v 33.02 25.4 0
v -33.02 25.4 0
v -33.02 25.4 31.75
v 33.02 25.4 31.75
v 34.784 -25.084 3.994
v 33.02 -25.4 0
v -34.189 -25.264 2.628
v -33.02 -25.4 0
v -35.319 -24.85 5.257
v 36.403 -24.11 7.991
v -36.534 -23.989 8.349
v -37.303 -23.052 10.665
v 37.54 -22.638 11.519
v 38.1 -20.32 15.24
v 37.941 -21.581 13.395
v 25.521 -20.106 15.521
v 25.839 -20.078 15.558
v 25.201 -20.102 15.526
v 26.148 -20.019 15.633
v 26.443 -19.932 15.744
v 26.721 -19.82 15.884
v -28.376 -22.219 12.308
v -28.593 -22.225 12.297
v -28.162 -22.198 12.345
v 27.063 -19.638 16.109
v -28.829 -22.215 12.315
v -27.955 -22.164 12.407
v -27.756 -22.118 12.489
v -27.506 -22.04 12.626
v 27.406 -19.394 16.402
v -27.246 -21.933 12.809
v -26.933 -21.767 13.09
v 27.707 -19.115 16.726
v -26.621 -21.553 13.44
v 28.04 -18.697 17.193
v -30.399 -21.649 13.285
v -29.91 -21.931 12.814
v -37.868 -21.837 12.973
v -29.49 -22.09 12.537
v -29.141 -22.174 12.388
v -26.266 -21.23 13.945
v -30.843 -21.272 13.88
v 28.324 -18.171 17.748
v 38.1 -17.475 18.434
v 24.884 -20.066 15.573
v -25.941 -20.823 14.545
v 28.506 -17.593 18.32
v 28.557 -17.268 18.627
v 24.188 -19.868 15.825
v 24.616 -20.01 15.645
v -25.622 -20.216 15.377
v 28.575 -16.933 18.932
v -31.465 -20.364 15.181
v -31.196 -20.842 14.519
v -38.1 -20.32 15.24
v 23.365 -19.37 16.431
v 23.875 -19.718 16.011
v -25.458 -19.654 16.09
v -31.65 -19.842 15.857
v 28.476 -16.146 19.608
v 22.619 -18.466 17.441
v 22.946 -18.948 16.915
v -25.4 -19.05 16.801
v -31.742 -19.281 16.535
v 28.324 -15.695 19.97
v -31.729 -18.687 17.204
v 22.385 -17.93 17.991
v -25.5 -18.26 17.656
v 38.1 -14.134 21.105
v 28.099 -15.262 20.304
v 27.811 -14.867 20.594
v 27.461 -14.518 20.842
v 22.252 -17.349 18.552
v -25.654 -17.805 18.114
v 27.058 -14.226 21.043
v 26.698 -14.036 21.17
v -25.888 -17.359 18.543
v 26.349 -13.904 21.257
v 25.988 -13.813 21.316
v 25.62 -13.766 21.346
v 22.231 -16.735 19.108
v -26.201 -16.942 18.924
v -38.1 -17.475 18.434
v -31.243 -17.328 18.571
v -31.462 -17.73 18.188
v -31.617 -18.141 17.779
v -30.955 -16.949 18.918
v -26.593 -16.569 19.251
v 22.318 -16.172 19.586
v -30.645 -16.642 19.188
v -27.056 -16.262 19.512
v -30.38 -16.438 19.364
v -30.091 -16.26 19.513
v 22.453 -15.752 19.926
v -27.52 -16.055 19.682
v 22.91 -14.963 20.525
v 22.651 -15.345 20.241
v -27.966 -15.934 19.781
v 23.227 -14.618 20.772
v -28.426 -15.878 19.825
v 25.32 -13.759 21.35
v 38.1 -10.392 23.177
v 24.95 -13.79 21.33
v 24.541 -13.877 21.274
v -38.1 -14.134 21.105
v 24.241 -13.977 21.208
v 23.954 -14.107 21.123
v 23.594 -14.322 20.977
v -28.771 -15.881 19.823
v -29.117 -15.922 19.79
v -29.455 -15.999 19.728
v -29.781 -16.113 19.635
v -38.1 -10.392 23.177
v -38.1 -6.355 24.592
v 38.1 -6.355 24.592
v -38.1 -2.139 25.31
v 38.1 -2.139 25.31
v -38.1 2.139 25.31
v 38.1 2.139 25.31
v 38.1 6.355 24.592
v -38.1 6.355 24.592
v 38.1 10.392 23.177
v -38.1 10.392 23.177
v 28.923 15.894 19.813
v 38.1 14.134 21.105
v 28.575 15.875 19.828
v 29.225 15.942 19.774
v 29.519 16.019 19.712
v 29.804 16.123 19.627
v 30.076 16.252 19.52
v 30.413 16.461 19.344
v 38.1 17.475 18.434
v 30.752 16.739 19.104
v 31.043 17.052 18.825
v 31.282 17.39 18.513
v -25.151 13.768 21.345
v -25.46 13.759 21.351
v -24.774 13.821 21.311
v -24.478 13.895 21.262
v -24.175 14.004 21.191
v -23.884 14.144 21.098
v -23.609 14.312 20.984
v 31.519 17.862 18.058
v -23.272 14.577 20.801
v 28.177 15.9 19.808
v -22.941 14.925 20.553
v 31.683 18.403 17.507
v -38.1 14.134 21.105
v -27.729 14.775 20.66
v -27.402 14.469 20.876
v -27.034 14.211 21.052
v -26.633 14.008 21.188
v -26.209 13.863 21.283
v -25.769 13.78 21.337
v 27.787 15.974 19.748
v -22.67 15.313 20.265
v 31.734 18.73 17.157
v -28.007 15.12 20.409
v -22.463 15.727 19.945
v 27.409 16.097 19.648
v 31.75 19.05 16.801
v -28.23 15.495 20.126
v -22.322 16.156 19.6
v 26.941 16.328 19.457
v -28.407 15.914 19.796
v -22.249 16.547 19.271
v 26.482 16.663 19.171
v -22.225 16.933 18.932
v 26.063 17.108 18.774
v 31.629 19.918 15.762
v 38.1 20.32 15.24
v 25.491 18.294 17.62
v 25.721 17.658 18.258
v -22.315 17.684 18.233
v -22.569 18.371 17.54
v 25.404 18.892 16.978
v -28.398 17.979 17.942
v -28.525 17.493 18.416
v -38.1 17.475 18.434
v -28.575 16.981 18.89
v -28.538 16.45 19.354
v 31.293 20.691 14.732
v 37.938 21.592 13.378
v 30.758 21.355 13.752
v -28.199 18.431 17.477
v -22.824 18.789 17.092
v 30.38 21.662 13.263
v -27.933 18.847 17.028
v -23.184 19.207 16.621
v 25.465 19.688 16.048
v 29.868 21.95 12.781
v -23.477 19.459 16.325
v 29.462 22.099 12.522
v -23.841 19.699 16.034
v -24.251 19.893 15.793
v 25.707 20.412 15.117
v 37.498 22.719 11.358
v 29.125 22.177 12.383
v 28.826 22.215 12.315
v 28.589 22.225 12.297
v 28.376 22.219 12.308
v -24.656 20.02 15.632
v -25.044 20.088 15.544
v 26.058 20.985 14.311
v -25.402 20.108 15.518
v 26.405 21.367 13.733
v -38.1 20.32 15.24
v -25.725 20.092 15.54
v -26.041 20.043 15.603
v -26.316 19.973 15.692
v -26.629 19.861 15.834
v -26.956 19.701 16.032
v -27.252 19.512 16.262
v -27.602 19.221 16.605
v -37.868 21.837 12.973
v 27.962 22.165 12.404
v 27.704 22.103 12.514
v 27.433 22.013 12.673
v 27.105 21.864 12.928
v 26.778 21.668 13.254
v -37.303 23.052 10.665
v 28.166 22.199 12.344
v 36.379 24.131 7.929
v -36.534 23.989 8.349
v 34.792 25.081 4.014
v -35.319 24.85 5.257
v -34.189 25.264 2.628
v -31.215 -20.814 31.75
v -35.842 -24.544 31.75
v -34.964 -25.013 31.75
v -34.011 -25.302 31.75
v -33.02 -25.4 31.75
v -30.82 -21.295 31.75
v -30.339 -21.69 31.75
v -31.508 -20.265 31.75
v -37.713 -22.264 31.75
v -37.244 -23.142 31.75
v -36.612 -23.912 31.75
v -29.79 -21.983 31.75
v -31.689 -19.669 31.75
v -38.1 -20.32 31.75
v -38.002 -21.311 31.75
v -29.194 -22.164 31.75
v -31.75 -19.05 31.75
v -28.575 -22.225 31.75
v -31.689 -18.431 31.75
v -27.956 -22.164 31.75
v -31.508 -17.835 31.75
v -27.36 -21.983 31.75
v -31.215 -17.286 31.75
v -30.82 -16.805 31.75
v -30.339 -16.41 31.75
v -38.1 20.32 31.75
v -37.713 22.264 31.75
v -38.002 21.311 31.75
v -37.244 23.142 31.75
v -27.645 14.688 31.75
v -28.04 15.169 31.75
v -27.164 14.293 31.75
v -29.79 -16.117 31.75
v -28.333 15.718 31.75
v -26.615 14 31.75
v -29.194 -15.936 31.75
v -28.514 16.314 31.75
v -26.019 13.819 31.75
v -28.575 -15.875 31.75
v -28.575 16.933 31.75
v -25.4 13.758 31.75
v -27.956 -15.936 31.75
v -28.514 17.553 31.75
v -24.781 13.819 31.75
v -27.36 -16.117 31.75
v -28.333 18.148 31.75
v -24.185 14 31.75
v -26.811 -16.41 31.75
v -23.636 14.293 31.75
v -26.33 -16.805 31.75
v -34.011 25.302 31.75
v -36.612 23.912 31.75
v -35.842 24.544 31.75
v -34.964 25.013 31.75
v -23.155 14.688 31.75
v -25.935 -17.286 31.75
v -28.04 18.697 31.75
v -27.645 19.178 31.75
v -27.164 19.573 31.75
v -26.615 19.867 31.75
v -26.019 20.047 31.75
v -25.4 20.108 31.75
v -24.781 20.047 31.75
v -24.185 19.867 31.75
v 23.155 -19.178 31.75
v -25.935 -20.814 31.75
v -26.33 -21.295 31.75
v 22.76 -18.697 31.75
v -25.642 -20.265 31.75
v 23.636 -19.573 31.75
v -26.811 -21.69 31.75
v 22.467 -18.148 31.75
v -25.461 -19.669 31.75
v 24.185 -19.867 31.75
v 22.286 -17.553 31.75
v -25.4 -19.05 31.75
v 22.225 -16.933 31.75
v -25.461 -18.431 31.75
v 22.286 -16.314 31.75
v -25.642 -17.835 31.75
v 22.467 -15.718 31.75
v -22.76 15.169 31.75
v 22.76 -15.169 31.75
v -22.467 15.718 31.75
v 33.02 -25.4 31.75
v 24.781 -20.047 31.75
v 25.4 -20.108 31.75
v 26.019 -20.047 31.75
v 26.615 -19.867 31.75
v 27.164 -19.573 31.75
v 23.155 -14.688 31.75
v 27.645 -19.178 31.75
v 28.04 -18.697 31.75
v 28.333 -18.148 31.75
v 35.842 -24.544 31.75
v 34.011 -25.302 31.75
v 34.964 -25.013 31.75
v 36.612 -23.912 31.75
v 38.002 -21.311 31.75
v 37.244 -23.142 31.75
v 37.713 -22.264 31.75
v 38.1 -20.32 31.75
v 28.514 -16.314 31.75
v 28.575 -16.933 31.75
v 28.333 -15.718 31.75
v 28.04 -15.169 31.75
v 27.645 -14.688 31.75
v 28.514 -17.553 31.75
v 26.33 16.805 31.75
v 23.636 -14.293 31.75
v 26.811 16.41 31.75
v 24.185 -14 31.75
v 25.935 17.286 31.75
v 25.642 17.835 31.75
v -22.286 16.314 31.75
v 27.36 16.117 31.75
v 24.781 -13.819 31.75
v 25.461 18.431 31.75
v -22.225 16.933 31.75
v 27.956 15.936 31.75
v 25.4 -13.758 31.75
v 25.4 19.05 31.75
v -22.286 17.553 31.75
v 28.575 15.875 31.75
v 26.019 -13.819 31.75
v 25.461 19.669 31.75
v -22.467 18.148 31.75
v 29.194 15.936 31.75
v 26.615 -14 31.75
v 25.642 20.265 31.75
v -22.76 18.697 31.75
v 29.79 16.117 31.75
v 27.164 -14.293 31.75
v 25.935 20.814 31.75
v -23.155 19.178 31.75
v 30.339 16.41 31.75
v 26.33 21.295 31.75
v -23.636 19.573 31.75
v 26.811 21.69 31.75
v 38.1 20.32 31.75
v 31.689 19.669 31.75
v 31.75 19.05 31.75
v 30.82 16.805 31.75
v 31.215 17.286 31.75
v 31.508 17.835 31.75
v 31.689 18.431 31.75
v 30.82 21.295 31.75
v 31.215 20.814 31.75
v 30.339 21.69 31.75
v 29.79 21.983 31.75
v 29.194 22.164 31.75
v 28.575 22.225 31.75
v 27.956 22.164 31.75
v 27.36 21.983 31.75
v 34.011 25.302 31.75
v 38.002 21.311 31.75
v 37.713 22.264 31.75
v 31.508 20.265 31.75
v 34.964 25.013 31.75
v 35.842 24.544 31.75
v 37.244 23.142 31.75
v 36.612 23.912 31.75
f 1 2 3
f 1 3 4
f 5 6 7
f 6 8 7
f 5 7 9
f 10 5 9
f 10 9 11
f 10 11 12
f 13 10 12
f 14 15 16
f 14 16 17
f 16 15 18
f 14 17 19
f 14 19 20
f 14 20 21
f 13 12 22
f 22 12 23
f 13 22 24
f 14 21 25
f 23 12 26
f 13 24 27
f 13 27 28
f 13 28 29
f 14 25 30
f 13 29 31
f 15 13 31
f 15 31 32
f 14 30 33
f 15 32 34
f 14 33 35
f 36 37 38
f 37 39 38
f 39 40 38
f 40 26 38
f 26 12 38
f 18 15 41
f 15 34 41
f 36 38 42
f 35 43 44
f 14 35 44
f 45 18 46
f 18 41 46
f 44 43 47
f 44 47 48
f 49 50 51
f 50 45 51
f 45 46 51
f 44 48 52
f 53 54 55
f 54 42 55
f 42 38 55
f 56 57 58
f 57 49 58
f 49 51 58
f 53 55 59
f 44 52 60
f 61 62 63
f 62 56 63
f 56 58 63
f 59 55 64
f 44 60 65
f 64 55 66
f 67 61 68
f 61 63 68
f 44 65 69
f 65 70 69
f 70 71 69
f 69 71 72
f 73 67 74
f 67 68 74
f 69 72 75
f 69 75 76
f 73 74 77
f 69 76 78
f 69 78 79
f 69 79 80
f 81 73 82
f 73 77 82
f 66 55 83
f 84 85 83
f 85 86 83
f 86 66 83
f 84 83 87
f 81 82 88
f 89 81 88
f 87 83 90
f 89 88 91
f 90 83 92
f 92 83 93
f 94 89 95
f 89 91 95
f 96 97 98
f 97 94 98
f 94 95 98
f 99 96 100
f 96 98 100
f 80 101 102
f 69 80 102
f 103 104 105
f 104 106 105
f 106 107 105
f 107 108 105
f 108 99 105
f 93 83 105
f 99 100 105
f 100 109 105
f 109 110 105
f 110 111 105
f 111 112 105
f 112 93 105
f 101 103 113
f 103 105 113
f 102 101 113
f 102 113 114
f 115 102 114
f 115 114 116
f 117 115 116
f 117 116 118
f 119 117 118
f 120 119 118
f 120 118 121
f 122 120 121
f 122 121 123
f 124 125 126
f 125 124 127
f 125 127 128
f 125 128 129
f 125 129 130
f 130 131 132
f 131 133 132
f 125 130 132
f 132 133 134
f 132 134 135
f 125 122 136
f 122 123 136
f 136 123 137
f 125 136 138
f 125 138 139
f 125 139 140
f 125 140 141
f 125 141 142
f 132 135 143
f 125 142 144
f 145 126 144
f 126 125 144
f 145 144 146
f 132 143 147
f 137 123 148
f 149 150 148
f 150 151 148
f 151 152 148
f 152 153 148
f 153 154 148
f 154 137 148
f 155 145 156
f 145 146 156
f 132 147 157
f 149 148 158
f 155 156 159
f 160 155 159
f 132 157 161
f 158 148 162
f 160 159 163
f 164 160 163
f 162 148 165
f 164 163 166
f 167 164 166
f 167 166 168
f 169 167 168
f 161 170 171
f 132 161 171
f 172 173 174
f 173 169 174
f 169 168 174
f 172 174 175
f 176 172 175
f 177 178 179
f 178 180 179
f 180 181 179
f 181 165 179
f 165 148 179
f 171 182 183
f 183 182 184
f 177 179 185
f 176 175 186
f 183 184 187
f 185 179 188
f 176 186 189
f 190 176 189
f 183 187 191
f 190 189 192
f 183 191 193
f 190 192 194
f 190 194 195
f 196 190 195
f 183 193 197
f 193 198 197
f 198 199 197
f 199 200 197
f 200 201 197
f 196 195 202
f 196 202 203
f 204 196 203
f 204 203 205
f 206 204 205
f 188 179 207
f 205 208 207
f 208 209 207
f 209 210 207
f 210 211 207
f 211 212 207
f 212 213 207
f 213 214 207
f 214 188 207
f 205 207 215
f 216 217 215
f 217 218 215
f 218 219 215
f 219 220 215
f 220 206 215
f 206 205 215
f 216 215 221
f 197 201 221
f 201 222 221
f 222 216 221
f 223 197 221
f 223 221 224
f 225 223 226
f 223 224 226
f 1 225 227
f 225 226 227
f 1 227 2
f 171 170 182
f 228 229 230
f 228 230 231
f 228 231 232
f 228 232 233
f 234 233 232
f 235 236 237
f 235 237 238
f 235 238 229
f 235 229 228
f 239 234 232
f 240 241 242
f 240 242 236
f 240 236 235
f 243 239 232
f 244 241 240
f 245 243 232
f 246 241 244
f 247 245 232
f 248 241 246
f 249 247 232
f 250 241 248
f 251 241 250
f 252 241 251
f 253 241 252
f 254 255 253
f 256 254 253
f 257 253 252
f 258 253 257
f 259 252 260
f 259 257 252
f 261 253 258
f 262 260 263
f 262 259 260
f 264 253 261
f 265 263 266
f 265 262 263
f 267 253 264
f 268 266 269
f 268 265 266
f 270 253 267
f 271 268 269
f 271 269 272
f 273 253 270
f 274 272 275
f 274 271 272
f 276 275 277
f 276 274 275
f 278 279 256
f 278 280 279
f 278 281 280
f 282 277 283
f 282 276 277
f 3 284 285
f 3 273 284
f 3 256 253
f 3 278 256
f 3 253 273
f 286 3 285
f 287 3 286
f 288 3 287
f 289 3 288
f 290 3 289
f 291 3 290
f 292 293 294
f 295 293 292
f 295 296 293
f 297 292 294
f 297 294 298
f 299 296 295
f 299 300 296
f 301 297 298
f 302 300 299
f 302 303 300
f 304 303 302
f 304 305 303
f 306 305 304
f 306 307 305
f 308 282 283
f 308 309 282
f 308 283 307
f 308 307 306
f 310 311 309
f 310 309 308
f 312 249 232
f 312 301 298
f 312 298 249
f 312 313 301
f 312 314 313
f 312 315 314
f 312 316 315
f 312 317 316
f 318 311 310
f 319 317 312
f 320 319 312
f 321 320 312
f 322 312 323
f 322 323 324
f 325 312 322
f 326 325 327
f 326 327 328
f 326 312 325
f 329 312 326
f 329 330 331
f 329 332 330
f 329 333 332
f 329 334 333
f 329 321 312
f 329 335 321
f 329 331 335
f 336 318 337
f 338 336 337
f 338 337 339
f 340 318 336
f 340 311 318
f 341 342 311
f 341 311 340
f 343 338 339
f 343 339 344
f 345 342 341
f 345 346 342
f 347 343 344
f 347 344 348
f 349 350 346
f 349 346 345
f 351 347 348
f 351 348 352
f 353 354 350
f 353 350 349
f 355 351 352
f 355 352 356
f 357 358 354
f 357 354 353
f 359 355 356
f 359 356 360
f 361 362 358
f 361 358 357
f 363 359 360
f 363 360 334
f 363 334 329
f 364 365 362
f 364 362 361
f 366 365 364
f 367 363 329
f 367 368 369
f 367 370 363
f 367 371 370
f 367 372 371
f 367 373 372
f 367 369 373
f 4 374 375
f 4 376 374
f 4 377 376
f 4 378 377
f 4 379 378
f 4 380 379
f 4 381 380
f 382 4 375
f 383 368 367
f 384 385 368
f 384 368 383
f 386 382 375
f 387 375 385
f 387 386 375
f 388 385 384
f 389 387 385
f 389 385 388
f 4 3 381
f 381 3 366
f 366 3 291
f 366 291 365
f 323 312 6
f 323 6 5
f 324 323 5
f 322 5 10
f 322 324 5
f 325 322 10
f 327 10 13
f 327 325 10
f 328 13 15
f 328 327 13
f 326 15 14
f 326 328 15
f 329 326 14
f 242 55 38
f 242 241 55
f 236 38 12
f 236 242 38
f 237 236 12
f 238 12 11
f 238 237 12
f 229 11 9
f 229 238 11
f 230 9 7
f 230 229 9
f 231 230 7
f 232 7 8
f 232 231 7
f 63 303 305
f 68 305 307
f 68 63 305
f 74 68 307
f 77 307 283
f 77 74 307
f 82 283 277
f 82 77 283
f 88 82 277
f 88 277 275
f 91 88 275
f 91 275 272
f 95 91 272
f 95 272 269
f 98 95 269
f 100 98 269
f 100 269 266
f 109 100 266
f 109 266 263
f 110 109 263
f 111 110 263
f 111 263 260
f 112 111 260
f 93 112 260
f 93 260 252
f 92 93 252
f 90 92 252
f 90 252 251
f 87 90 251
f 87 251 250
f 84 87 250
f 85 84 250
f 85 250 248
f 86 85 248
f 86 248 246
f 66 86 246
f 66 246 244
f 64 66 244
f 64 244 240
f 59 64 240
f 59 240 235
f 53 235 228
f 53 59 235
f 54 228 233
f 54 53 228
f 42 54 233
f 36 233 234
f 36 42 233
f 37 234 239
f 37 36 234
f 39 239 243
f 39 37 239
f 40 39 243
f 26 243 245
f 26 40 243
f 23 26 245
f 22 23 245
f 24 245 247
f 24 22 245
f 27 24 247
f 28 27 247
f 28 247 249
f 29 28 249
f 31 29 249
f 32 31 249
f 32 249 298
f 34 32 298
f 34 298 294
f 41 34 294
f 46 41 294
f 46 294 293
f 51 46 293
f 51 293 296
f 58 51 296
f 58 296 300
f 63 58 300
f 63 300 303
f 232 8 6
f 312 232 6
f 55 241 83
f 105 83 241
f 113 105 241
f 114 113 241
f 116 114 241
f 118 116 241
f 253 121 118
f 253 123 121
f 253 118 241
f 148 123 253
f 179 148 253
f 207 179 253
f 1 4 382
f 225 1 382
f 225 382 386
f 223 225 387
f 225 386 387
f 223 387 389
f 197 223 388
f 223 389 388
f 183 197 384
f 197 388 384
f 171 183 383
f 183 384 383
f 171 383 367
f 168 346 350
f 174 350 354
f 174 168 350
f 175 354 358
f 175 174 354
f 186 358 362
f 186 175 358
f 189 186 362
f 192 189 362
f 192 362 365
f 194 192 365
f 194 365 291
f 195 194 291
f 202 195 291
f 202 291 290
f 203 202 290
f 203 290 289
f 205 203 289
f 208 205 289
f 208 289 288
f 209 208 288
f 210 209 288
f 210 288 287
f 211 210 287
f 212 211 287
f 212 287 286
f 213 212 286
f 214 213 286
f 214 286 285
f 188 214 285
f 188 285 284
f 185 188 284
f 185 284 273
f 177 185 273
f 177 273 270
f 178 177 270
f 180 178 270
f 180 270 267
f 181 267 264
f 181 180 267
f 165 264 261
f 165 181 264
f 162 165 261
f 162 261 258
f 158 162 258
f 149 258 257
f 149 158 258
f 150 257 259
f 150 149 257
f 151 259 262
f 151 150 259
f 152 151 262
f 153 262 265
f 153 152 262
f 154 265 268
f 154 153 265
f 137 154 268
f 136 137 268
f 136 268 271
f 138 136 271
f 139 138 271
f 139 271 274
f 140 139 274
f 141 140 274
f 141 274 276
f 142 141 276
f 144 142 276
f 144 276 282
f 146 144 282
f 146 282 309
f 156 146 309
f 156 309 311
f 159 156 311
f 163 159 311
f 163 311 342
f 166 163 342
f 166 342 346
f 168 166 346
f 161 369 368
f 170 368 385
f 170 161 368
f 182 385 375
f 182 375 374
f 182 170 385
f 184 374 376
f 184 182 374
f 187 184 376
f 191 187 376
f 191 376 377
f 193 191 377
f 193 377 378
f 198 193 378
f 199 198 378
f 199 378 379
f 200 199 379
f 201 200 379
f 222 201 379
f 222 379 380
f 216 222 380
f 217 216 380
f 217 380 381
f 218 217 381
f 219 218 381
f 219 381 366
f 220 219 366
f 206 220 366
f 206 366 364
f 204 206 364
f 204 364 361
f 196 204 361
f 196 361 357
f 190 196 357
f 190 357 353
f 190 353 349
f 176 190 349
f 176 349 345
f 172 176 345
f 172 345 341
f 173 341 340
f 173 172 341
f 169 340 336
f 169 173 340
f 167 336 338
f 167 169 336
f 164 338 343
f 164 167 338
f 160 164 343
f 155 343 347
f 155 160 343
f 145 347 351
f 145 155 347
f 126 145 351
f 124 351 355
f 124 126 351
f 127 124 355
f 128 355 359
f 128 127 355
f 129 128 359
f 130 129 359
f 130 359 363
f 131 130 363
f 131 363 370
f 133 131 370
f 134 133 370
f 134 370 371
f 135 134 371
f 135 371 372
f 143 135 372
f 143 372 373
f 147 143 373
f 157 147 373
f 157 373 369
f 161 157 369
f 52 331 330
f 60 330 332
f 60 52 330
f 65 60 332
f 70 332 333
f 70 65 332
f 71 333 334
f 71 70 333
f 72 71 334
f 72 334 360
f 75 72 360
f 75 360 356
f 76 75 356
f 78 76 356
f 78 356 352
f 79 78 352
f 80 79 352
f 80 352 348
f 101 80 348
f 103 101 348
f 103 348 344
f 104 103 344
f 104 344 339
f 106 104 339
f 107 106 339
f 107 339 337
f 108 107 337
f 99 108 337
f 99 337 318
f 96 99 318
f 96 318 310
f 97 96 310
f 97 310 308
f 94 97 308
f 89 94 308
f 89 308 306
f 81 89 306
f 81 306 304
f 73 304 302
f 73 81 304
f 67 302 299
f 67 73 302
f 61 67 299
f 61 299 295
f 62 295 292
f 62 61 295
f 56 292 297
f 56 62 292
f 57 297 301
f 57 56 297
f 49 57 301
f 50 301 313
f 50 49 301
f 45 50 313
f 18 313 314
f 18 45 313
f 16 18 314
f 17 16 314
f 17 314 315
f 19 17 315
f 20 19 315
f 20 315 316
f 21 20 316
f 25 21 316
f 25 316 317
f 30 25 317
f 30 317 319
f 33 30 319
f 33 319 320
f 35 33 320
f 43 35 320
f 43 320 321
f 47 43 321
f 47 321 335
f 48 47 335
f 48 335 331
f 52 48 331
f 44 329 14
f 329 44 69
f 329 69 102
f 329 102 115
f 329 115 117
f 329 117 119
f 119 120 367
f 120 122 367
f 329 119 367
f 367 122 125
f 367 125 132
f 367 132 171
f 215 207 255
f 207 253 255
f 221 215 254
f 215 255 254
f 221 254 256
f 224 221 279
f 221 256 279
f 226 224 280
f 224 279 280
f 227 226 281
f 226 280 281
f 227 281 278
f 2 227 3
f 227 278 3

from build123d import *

# Parameters (mm, degrees)
F0_W     = 76.2
F0_H     = 50.8
F0_R     = 3.175
F1_DEPTH = 31.75
F2_R     = 5.08
F4_DEPTH = 76.201


with BuildPart() as f1:
    # F0 (on Top) → F1 (new body)
    with BuildSketch(Plane.XY):
        Rectangle(F0_W, F0_H)
        with Locations((-28.575, -19.05)):
            Circle(F0_R, mode=Mode.SUBTRACT)
        with Locations((25.4, -16.933333)):
            Circle(F0_R, mode=Mode.SUBTRACT)
        with Locations((-25.4, 16.933333)):
            Circle(F0_R, mode=Mode.SUBTRACT)
        with Locations((28.575, 19.05)):
            Circle(F0_R, mode=Mode.SUBTRACT)
    extrude(amount=F1_DEPTH)

    # F2
    f2_edges = [f1.edges().sort_by_distance(p)[0] for p in [
        (-38.1, 25.4, 15.875),
        (-38.1, -25.4, 15.875),
        (38.1, 25.4, 15.875),
        (38.1, -25.4, 15.875),
    ]]
    fillet(f2_edges, radius=F2_R)

    # F3 (on face) → F4 (cut, through all)
    with BuildSketch(Plane(origin=(-38.1, 0, 0), x_dir=(0, -1, 0), z_dir=(-1, 0, 0))):
        with BuildLine():
            Line((-25.4, 0), (25.4, 0))
            ThreePointArc((25.4, 0), (0, 25.4), (-25.4, 0))
        make_face()
    extrude(amount=-F4_DEPTH, mode=Mode.SUBTRACT)


solid = f1.part
